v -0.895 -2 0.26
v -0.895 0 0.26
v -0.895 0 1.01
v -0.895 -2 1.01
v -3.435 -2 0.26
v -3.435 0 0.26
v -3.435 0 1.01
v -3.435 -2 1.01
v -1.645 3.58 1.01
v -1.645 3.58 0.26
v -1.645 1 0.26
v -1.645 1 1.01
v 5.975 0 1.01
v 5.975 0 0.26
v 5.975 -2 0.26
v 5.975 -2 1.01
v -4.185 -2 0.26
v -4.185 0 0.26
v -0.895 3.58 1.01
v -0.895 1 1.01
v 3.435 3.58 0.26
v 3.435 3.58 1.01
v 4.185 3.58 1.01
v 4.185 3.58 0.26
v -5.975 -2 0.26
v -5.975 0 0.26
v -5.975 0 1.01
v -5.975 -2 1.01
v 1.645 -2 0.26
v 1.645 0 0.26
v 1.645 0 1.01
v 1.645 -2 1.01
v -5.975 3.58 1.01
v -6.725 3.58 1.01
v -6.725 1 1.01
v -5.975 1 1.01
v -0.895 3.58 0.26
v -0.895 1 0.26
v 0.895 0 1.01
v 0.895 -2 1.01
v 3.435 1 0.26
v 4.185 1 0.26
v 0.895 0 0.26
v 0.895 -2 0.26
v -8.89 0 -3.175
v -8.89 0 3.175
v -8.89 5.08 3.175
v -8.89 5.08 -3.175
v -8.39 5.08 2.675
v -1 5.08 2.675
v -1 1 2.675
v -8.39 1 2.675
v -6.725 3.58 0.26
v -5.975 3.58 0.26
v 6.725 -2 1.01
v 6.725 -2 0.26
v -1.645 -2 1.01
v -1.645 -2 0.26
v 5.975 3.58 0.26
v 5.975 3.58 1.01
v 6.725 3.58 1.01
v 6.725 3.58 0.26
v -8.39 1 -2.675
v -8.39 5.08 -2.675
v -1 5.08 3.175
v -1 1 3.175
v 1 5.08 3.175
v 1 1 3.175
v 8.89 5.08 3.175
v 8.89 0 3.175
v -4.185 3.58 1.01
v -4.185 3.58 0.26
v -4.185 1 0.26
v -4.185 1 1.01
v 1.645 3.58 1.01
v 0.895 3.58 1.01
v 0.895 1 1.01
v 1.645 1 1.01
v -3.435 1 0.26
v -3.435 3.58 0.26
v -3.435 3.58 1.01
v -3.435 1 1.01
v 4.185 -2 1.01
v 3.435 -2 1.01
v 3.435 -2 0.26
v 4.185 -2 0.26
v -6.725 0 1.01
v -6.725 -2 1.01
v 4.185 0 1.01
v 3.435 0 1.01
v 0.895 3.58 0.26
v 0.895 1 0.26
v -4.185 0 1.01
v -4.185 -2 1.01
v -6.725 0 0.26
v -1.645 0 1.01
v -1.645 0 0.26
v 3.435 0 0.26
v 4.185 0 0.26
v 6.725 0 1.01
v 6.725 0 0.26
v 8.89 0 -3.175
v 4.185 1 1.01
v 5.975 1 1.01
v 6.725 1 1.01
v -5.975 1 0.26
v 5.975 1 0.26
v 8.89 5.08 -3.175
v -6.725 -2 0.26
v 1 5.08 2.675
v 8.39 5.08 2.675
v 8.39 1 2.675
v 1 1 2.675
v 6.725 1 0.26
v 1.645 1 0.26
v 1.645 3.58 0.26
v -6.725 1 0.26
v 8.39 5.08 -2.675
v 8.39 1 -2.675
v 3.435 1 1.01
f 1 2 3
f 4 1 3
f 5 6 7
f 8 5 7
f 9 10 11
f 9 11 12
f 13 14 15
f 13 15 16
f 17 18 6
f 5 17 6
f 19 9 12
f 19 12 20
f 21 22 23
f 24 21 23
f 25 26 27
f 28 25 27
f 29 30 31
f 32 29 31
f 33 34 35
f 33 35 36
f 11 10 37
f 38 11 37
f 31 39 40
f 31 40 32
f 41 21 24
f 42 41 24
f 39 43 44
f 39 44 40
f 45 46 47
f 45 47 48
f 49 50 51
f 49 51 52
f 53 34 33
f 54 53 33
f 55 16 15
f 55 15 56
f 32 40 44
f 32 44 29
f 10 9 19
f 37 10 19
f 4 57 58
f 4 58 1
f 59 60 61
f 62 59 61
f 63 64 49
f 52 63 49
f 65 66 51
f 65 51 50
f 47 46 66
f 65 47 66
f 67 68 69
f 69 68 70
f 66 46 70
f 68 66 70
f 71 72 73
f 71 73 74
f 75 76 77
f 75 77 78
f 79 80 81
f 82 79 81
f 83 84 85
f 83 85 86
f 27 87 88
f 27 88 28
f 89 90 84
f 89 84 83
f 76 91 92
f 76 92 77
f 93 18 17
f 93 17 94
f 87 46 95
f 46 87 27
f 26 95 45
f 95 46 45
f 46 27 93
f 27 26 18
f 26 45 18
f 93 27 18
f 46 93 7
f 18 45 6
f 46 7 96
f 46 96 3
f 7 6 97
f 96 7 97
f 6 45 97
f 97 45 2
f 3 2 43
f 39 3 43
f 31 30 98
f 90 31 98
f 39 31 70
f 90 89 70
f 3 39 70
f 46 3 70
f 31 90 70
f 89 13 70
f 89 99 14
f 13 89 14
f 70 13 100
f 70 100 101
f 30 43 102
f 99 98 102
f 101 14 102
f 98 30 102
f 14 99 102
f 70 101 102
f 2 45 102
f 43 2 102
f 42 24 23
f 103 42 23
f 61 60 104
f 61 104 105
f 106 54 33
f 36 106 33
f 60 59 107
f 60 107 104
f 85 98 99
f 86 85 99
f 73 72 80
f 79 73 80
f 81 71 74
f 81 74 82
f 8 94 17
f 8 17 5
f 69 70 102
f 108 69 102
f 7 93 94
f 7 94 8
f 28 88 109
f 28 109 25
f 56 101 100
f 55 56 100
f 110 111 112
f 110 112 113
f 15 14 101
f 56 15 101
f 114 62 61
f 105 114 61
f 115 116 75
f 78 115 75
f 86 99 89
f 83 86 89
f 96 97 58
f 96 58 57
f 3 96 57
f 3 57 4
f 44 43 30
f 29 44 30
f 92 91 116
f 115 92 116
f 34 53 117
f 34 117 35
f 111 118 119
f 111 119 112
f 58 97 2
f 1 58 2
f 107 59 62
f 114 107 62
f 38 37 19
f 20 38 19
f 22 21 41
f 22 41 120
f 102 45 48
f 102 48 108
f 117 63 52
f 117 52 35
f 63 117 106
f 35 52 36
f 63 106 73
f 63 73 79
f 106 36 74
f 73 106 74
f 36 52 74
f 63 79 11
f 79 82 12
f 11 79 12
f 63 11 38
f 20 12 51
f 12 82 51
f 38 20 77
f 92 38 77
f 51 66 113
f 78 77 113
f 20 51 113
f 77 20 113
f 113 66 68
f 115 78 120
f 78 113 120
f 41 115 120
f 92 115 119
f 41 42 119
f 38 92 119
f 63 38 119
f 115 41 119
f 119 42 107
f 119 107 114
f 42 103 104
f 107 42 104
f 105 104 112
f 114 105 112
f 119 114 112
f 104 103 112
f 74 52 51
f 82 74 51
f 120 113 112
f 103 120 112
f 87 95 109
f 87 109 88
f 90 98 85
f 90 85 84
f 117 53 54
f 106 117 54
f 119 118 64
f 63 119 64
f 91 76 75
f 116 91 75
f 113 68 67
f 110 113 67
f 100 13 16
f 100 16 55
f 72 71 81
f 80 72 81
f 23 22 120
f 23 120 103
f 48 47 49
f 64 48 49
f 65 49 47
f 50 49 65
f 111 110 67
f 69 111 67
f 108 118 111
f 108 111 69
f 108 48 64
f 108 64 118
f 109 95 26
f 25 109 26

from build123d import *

# Parameters (mm, degrees)
SKETCH_1_W           = 17.78
SKETCH_1_H           = 6.35
EXTRUDE_1_DEPTH      = 5.08
SKETCH_2_W           = 16.78
SKETCH_2_H           = 5.35
CUT_EXTRUDE_1_DEPTH  = 4.08
SKETCH_3_W           = 2
SKETCH_3_H           = 4.08
CUT_EXTRUDE_2_DEPTH  = 1
EXTRUDE_2_DEPTH      = 2
EXTRUDE_2_DEPTH_BACK = 3.58
SKETCH_4_W           = 0.75
SKETCH_4_H           = 0.75


with BuildPart() as part:
    # 草图1 → 拉伸1 (new body)
    with BuildSketch(Plane(origin=(0, 0, 0), x_dir=(1, 0, 0), z_dir=(0, 1, 0))):
        Rectangle(SKETCH_1_W, SKETCH_1_H)
    extrude(amount=EXTRUDE_1_DEPTH)

    # 草图2 → 切除-拉伸1 (cut)
    with BuildSketch(Plane(origin=(0, 5.08, 0), x_dir=(-1, 0, 0), z_dir=(0, 1, 0))):
        Rectangle(SKETCH_2_W, SKETCH_2_H)
    extrude(amount=-CUT_EXTRUDE_1_DEPTH, mode=Mode.SUBTRACT)

    # 草图3 → 切除-拉伸2 (cut)
    with BuildSketch(Plane.XY.offset(3.175)):
        with Locations((0, 3.04)):
            Rectangle(SKETCH_3_W, SKETCH_3_H)
    extrude(amount=-CUT_EXTRUDE_2_DEPTH, mode=Mode.SUBTRACT)

    # 草图4 → 拉伸2 (add, two sides: drawn at the far end of the back side and taken through both)
    with BuildSketch(Plane.XZ.offset(-EXTRUDE_2_DEPTH_BACK)):
        with Locations((-1.27, 0.635)):
            Rectangle(SKETCH_4_W, SKETCH_4_H)
        with Locations((1.27, 0.635)):
            Rectangle(SKETCH_4_W, SKETCH_4_H)
        with Locations((3.81, 0.635)):
            Rectangle(SKETCH_4_W, SKETCH_4_H)
        with Locations((6.35, 0.635)):
            Rectangle(SKETCH_4_W, SKETCH_4_H)
        with Locations((-3.81, 0.635)):
            Rectangle(SKETCH_4_W, SKETCH_4_H)
        with Locations((-6.35, 0.635)):
            Rectangle(SKETCH_4_W, SKETCH_4_H)
    extrude(amount=EXTRUDE_2_DEPTH + EXTRUDE_2_DEPTH_BACK)


solid = part.part
